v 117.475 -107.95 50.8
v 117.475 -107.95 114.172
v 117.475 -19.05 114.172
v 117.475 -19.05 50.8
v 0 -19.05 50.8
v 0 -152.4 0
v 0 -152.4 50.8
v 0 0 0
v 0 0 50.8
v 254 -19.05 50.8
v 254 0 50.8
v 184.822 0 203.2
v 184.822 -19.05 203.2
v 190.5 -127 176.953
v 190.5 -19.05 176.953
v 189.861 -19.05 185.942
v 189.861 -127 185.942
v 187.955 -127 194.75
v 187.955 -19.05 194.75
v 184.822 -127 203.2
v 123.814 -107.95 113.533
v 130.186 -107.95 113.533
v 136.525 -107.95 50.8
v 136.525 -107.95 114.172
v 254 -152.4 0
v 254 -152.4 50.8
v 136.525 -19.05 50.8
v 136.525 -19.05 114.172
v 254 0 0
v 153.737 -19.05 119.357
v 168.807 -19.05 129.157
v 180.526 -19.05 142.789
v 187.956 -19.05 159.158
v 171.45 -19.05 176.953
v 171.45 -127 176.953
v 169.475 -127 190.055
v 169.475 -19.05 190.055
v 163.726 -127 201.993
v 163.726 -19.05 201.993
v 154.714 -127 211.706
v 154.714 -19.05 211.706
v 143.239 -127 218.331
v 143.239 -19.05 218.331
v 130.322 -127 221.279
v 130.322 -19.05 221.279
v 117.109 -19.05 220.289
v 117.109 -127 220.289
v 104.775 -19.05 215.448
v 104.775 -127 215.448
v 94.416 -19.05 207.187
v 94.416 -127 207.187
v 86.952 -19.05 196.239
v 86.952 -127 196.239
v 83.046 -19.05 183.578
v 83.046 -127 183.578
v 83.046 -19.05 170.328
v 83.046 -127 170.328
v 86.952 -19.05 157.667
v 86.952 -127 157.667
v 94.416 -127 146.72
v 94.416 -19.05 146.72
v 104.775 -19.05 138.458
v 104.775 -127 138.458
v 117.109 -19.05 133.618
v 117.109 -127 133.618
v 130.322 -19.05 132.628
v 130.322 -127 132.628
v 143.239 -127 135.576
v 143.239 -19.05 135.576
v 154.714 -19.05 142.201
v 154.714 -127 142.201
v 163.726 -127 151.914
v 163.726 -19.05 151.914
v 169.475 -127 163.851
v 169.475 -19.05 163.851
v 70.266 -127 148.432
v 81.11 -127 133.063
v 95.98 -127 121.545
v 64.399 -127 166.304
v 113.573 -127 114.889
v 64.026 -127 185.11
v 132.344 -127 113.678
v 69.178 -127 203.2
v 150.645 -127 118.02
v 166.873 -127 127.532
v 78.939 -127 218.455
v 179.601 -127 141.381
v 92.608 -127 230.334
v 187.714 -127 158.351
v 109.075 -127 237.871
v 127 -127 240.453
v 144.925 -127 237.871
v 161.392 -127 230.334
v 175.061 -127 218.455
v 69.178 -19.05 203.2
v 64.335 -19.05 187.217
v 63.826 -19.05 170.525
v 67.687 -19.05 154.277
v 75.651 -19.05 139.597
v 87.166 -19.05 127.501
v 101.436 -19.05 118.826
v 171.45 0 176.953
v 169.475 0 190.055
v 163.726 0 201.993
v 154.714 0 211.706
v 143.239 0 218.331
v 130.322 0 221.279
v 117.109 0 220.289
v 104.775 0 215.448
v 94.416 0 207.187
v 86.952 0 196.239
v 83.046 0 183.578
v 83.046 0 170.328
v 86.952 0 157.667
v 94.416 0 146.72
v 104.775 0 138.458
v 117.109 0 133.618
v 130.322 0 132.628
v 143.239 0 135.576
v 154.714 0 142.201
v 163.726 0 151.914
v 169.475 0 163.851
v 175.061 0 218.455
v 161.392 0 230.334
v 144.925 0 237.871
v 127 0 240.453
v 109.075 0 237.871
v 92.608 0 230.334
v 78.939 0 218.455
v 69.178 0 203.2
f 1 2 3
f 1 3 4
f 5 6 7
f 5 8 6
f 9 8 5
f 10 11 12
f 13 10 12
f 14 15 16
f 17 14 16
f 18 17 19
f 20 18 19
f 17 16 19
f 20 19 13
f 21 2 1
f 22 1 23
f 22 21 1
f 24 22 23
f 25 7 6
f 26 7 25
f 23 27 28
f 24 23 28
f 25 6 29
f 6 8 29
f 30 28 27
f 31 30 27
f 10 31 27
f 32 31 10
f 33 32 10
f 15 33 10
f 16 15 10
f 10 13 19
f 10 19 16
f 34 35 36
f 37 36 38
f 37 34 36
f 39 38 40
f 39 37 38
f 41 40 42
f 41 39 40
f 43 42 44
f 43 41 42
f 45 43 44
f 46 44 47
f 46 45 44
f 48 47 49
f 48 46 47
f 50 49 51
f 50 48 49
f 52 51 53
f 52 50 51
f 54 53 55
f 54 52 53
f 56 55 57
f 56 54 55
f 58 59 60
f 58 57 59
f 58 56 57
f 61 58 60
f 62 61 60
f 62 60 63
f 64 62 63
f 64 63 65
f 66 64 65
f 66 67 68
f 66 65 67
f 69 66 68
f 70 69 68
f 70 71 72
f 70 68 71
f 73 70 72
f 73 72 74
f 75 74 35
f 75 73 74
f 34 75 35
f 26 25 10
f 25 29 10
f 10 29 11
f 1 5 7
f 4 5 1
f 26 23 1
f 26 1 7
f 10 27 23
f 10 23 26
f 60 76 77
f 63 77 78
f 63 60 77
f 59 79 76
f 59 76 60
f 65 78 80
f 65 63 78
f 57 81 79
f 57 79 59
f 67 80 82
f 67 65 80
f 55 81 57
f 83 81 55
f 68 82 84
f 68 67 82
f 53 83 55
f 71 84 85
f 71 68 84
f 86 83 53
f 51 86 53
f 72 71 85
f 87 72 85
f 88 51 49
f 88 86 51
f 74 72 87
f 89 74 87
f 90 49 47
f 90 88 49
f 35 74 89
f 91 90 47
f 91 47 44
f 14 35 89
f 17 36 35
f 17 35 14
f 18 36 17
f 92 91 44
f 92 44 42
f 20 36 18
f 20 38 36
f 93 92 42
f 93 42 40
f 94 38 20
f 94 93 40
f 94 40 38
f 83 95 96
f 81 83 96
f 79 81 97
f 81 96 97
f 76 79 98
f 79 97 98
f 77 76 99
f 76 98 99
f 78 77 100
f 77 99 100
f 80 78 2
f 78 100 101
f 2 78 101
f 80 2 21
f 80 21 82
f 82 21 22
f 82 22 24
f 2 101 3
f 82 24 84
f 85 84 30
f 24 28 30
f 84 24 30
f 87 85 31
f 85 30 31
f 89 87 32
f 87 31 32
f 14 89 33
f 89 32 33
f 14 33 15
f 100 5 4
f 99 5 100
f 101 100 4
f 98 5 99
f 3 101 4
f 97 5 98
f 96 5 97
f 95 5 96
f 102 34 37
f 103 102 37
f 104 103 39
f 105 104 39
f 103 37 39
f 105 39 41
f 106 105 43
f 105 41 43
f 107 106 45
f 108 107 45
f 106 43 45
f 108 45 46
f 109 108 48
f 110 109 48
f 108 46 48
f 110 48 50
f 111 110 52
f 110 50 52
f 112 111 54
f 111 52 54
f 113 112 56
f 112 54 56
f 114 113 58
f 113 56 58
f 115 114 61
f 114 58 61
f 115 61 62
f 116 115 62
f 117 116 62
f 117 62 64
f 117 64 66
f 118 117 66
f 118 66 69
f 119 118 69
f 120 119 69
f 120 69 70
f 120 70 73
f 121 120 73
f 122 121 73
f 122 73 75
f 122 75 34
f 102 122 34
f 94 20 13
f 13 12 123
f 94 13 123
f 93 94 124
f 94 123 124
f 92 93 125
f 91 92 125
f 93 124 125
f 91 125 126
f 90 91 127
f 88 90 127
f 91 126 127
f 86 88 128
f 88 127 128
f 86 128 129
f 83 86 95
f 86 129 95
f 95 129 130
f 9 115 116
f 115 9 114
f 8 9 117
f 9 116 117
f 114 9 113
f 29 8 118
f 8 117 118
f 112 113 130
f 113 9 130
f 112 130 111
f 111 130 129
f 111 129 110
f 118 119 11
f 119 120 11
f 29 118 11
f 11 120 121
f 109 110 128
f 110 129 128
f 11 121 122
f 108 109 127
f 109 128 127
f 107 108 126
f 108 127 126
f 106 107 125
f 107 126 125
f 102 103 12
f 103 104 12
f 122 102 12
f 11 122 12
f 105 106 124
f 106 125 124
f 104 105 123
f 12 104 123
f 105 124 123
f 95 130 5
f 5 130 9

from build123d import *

# Parameters (mm, degrees)
F1_DEPTH      = 19.05
F2_W          = 254
F2_H          = 50.8
F3_DEPTH      = 133.35
F5_R          = 44.45
F6_DEPTH      = 19.051
F7_DEPTH      = 107.95
F8_DEPTH      = 133.351
F8_DEPTH_BACK = 19.051
F10_DEPTH     = 88.9


with BuildPart() as f1:
    # F0 (on Front) → F1 (new body)
    with BuildSketch(Plane.XZ):
        with BuildLine():
            Line((0, 50.8), (0, 0))
            Line((0, 0), (254, 0))
            Line((254, 0), (254, 50.8))
            Line((254, 50.8), (184.82177, 203.2))
            ThreePointArc((184.82177, 203.2), (127, 240.45323), (69.17823, 203.2))
            Line((69.17823, 203.2), (0, 50.8))
        make_face()
    extrude(amount=F1_DEPTH)

    # F2 (on face) → F3 (join)
    with BuildSketch(Plane.XZ.offset(19.05)):
        with Locations((127, 25.4)):
            Rectangle(F2_W, F2_H)
    extrude(amount=F3_DEPTH)

    # F5 (on face) → F6 (cut, through all)
    with BuildSketch(Plane.XZ.offset(19.05)):
        with Locations((127, 176.95323)):
            Circle(F5_R)
    extrude(amount=-F6_DEPTH, mode=Mode.SUBTRACT)

    # F4 (on face) → F7 (join)
    with BuildSketch(Plane.XZ.offset(19.05)):
        with BuildLine():
            ThreePointArc((69.17823, 203.2), (113.57302, 114.88902), (190.5, 176.95323))
            ThreePointArc((190.5, 176.95323), (189.06421, 190.380211), (184.82177, 203.2))
            ThreePointArc((184.82177, 203.2), (127, 240.45323), (69.17823, 203.2))
        make_face()
    extrude(amount=F7_DEPTH)

    # F5 (on face) → F8 (cut, two sides)
    with BuildSketch(Plane.XZ.offset(19.05)) as f8_sk:
        with Locations((127, 176.95323)):
            Circle(F5_R)
    extrude(amount=F8_DEPTH, mode=Mode.SUBTRACT)
    extrude(f8_sk.sketch, amount=-F8_DEPTH_BACK, mode=Mode.SUBTRACT)

    # F9 (on face) → F10 (join)
    with BuildSketch(Plane.XZ.offset(19.05)):
        with BuildLine():
            Line((117.475, 114.17167), (117.475, 50.8))
            Line((117.475, 50.8), (136.525, 50.8))
            Line((136.525, 50.8), (136.525, 114.17167))
            ThreePointArc((136.525, 114.17167), (127, 113.45323), (117.475, 114.17167))
        make_face()
    extrude(amount=F10_DEPTH)


solid = f1.part
